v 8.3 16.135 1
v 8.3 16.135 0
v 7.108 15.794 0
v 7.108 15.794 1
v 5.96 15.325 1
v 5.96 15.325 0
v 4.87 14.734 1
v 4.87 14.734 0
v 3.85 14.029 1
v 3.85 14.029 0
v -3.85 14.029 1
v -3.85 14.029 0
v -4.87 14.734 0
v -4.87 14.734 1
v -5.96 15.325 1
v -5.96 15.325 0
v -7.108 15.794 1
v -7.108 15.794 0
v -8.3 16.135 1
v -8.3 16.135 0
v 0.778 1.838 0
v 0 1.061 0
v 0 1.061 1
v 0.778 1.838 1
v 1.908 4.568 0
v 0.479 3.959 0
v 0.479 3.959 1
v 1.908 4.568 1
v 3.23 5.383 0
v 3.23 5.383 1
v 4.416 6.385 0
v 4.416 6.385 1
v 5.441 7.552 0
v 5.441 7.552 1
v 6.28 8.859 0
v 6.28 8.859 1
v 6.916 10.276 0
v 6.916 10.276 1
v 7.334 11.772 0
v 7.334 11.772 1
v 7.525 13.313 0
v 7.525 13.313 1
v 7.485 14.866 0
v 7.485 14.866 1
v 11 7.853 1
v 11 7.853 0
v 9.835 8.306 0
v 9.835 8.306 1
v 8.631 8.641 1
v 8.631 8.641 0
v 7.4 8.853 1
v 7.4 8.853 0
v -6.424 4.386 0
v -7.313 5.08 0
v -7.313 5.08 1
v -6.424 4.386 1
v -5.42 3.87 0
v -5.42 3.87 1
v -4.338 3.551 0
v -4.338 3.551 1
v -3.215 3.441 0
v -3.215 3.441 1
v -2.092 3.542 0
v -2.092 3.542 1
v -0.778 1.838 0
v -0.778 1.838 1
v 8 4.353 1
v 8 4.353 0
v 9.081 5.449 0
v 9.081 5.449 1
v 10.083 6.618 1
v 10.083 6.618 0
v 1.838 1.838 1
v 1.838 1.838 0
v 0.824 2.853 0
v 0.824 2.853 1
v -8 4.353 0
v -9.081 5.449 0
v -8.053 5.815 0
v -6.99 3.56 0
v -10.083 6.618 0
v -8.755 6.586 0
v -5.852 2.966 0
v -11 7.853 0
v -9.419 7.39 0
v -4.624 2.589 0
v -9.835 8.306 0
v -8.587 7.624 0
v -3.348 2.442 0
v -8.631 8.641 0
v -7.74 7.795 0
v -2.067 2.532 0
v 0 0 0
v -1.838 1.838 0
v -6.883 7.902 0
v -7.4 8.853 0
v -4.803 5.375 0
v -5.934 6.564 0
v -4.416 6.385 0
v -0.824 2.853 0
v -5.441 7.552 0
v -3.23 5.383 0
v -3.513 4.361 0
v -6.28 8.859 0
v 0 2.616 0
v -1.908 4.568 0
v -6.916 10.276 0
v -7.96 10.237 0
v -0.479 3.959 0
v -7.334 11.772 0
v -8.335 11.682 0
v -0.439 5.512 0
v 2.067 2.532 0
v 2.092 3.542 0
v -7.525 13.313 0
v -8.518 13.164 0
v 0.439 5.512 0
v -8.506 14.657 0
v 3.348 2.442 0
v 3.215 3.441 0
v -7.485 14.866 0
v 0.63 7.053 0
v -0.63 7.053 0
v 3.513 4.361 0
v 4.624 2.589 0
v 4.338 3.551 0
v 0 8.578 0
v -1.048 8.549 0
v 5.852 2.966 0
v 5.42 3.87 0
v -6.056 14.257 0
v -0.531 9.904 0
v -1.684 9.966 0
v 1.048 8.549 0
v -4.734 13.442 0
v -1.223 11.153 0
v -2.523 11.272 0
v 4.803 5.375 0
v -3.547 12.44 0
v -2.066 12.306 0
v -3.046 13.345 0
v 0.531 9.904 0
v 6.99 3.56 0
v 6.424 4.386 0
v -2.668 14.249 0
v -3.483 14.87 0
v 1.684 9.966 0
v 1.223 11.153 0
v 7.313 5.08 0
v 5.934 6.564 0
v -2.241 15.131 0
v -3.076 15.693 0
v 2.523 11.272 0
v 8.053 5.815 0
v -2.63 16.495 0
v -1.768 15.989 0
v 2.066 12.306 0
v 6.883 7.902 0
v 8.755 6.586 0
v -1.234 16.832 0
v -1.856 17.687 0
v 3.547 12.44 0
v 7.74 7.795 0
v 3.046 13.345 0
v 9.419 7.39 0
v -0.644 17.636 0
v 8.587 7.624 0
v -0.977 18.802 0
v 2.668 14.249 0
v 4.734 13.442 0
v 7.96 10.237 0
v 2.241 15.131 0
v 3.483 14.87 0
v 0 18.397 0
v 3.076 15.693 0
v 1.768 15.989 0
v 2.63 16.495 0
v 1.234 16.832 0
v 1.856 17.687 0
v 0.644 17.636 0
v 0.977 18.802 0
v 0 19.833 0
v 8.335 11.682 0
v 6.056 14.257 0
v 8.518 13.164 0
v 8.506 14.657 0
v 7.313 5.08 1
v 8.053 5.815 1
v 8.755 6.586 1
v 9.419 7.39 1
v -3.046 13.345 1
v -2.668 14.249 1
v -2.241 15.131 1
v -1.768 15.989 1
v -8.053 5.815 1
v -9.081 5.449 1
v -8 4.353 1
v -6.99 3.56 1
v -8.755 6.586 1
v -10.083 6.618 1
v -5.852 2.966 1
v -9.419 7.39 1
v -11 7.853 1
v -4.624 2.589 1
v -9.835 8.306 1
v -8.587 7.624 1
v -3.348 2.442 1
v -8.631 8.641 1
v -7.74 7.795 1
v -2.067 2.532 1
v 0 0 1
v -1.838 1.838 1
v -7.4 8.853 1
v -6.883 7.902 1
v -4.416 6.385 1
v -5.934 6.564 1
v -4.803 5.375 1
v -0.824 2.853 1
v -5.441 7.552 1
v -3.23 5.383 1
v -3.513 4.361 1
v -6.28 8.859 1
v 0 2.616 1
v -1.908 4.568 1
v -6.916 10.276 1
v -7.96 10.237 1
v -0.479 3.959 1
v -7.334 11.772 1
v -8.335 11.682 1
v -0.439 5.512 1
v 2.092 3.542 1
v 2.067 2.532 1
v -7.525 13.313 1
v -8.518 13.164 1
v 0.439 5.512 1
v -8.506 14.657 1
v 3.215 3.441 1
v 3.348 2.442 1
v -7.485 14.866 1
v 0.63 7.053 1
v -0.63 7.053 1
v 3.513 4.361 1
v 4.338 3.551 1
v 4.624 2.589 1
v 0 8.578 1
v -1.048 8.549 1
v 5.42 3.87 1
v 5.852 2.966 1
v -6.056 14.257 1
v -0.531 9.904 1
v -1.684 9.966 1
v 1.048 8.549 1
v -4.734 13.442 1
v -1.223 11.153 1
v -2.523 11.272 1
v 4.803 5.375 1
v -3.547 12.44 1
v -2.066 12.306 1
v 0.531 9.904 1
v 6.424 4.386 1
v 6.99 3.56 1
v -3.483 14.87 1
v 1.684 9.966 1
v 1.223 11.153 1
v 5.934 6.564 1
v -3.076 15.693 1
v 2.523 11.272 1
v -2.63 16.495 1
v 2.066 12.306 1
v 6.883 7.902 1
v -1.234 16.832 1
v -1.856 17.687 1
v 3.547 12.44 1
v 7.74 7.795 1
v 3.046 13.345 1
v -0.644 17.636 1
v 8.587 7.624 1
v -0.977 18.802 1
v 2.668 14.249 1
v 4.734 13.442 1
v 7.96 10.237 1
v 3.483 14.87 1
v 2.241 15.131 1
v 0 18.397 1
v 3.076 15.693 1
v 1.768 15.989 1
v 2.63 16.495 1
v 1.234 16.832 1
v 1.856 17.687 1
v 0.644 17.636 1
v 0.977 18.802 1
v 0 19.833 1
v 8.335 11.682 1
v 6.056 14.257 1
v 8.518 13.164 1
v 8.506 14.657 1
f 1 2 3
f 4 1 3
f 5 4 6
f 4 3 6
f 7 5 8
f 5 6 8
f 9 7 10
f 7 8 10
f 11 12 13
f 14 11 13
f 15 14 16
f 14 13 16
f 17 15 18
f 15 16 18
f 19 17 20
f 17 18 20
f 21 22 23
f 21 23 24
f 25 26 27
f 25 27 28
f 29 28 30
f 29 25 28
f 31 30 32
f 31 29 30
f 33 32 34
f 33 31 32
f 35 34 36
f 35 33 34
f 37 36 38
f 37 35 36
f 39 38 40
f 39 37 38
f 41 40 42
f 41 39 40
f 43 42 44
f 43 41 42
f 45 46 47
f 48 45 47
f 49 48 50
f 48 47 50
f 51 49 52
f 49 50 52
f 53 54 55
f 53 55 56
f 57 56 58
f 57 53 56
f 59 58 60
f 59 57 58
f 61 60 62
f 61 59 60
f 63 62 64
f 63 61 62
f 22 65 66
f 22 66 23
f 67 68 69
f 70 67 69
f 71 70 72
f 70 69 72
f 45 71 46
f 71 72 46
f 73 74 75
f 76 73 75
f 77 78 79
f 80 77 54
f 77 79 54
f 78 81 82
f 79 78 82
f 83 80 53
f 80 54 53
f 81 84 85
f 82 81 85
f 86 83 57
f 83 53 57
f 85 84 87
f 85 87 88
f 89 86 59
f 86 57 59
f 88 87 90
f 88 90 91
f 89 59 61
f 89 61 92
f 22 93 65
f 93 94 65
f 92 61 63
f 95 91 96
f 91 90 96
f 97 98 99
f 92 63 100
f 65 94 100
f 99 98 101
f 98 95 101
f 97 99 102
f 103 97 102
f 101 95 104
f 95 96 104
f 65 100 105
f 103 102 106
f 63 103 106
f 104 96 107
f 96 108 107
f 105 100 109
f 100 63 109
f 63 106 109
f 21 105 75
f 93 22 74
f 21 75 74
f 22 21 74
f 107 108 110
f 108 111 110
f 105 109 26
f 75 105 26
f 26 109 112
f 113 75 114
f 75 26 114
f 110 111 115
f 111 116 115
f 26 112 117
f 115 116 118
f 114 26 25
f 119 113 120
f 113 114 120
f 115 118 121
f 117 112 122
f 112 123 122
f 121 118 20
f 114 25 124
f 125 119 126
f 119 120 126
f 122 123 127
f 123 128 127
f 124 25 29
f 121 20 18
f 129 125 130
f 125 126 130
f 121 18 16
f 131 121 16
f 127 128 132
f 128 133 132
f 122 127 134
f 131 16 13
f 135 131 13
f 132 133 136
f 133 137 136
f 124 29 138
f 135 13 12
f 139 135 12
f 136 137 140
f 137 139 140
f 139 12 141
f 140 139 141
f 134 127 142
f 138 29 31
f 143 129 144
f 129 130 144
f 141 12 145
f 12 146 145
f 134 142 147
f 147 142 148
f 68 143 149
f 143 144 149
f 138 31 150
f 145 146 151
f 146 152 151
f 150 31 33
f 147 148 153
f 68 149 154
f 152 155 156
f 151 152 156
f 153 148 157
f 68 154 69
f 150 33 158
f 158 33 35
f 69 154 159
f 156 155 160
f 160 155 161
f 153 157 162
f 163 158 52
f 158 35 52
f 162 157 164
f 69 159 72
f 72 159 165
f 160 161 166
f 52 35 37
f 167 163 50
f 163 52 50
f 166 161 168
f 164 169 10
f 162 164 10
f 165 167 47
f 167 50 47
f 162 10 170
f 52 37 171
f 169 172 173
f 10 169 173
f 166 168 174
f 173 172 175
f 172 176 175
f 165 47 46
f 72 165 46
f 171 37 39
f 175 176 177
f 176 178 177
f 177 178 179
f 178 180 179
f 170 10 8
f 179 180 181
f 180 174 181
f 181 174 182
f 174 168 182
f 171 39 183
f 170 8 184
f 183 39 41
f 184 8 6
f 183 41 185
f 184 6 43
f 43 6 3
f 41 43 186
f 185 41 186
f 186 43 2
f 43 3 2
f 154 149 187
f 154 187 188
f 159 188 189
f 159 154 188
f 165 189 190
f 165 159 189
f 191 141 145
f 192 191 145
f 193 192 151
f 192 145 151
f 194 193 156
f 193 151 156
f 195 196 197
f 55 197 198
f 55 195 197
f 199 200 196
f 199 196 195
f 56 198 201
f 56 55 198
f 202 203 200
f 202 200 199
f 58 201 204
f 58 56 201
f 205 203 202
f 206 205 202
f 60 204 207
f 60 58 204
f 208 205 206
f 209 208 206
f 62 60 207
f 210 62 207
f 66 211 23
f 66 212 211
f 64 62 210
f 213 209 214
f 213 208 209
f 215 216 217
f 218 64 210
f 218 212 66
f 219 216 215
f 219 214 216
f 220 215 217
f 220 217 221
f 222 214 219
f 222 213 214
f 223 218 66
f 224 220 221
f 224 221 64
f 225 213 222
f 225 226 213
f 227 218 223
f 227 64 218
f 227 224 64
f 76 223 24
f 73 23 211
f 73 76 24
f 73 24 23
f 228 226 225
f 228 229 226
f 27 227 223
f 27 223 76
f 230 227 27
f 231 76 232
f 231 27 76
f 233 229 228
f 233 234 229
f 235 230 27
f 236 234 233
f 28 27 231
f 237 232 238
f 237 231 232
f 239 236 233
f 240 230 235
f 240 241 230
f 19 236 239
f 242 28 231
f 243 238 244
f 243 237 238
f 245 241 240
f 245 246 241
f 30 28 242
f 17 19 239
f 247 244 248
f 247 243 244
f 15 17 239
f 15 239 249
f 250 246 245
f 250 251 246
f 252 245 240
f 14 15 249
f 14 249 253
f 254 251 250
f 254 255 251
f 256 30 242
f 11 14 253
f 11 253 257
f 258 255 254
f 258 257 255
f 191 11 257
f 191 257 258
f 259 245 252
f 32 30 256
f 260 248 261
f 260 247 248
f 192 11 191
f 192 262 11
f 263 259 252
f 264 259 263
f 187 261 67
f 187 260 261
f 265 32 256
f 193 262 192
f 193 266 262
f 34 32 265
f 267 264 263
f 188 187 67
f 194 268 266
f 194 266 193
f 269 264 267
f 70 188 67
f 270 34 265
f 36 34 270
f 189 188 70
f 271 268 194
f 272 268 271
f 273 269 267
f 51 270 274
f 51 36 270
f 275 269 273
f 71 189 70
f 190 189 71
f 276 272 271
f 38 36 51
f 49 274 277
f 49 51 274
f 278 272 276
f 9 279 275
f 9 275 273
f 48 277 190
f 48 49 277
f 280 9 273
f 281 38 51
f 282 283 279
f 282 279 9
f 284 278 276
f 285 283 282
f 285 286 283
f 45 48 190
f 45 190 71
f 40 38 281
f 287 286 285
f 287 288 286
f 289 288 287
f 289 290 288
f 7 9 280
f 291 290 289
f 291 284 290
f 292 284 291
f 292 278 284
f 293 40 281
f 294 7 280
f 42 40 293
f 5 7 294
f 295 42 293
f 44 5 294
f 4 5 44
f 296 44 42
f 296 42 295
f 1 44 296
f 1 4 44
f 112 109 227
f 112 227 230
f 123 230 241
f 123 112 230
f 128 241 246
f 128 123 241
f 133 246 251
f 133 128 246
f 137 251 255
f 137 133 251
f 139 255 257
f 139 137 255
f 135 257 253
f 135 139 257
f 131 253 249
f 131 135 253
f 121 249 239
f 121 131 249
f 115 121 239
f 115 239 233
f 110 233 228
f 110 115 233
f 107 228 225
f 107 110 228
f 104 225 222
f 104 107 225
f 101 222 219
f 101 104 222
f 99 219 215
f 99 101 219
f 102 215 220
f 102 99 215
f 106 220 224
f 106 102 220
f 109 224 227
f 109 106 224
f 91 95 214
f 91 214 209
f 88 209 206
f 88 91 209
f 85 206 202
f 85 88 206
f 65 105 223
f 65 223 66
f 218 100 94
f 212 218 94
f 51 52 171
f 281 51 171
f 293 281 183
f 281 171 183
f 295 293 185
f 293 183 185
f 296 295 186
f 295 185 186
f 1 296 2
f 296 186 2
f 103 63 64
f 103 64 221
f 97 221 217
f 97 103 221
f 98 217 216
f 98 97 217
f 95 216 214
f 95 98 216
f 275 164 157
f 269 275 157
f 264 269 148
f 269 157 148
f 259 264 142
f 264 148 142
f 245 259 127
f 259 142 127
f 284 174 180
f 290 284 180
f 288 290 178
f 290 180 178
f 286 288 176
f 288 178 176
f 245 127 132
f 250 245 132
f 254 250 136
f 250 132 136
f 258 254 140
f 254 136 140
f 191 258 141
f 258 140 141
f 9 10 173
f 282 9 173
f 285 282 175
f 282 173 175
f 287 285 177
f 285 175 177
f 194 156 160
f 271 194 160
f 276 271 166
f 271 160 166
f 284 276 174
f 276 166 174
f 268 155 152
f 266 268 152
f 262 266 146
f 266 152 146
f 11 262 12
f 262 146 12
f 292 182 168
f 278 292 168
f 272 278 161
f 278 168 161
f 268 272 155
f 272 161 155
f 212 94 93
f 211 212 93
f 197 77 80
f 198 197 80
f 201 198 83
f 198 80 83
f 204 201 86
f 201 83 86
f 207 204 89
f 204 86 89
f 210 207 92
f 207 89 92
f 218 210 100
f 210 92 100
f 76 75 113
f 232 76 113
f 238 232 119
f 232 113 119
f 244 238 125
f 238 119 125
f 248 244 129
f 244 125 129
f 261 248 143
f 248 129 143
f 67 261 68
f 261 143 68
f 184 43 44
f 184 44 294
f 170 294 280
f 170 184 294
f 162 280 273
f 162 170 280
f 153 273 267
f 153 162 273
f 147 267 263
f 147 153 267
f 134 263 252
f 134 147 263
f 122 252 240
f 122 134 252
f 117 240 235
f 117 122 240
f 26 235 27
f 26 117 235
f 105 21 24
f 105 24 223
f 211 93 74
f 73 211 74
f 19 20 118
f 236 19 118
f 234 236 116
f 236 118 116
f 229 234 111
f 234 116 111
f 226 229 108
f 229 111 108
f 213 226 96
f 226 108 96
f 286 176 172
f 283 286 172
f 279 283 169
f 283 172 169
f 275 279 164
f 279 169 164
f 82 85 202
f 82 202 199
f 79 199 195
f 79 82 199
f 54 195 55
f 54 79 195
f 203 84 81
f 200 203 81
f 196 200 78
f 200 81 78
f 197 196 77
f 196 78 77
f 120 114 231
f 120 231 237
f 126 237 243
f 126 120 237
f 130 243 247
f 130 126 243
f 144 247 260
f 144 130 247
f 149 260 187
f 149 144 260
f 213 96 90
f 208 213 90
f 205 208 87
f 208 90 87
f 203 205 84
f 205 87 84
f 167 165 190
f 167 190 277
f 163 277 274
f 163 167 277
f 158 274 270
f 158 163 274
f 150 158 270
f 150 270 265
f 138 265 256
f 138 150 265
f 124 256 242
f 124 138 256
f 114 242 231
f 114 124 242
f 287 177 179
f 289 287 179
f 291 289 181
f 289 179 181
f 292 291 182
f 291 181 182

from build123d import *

# Parameters (mm, degrees)
BOSS_EXTRUDE1_DEPTH = 1


with BuildPart() as part:
    # Sketch1 → Boss-Extrude1 (new body)
    with BuildSketch(Plane.XY):
        with BuildLine():
            Line((0, 0), (1.838477631, 1.838477631))
            Line((1.838477631, 1.838477631), (0.823678808, 2.853276454))
            ThreePointArc((0.823678808, 2.853276454), (4.623918861, 2.588642918), (8, 4.353276454))
            ThreePointArc((8, 4.353276454), (9.591924549, 6.024483983), (11, 7.853276454))
            ThreePointArc((11, 7.853276454), (9.237519313, 8.488345979), (7.4, 8.853276454))
            ThreePointArc((7.4, 8.853276454), (8.450856423, 12.419917717), (8.3, 16.135085474))
            ThreePointArc((8.3, 16.135085474), (5.960145608, 15.324834522), (3.85, 14.029183838))
            ThreePointArc((3.85, 14.029183838), (3.284007759, 15.28410345), (2.63, 16.495484604))
            ThreePointArc((2.63, 16.495484604), (1.429185762, 18.254368816), (0, 19.833310412))
            ThreePointArc((0, 19.833310412), (-1.429185762, 18.254368816), (-2.63, 16.495484604))
            ThreePointArc((-2.63, 16.495484604), (-3.284007759, 15.28410345), (-3.85, 14.029183838))
            ThreePointArc((-3.85, 14.029183838), (-5.960145608, 15.324834522), (-8.3, 16.135085474))
            ThreePointArc((-8.3, 16.135085474), (-8.450856423, 12.419917717), (-7.4, 8.853276454))
            ThreePointArc((-7.4, 8.853276454), (-9.237519313, 8.488345979), (-11, 7.853276454))
            ThreePointArc((-11, 7.853276454), (-9.591924549, 6.024483983), (-8, 4.353276454))
            ThreePointArc((-8, 4.353276454), (-4.623918861, 2.588642918), (-0.823678808, 2.853276454))
            Line((-0.823678808, 2.853276454), (-1.838477631, 1.838477631))
            Line((-1.838477631, 1.838477631), (0, 0))
        make_face()
        Polygon((0, 1.060660172), (0.777817459, 1.838477631), (0, 2.61629509), (-0.777817459, 1.838477631), align=None, mode=Mode.SUBTRACT)
        with BuildLine():
            ThreePointArc((1.767555689, 15.989332639), (2.460089794, 14.692656758), (3.046312622, 13.344578636))
            ThreePointArc((3.046312622, 13.344578636), (1.223262024, 11.152840308), (0, 8.577794598))
            ThreePointArc((0, 8.577794598), (-1.223262024, 11.152840308), (-3.046312622, 13.344578636))
            ThreePointArc((-3.046312622, 13.344578636), (-2.460089794, 14.692656758), (-1.767555689, 15.989332639))
            ThreePointArc((-1.767555689, 15.989332639), (-0.945525016, 17.238680092), (0, 18.397380194))
            ThreePointArc((0, 18.397380194), (0.945525016, 17.238680092), (1.767555689, 15.989332639))
        make_face(mode=Mode.SUBTRACT)
        with BuildLine():
            ThreePointArc((7.484522548, 14.86555012), (2.078927518, 10.634692843), (0.478972095, 3.959308692))
            ThreePointArc((0.478972095, 3.959308692), (5.884567125, 8.190165969), (7.484522548, 14.86555012))
        make_face(mode=Mode.SUBTRACT)
        with BuildLine():
            ThreePointArc((2.091646058, 3.542273843), (4.886787797, 3.684978553), (7.313103604, 5.080031806))
            ThreePointArc((7.313103604, 5.080031806), (8.408951023, 6.195914234), (9.418710619, 7.390259542))
            ThreePointArc((9.418710619, 7.390259542), (8.165419306, 7.717459739), (6.883314947, 7.901870952))
            ThreePointArc((6.883314947, 7.901870952), (4.803155716, 5.375111185), (2.091646058, 3.542273843))
        make_face(mode=Mode.SUBTRACT)
        with BuildLine():
            ThreePointArc((-6.883314947, 7.901870952), (-8.165419306, 7.717459739), (-9.418710619, 7.390259542))
            ThreePointArc((-9.418710619, 7.390259542), (-8.408951023, 6.195914234), (-7.313103604, 5.080031806))
            ThreePointArc((-7.313103604, 5.080031806), (-4.886787797, 3.684978553), (-2.091646058, 3.542273843))
            ThreePointArc((-2.091646058, 3.542273843), (-4.803155716, 5.375111185), (-6.883314947, 7.901870952))
        make_face(mode=Mode.SUBTRACT)
        with BuildLine():
            ThreePointArc((-7.484522548, 14.86555012), (-5.884567125, 8.190165969), (-0.478972095, 3.959308692))
            ThreePointArc((-0.478972095, 3.959308692), (-2.078927518, 10.634692843), (-7.484522548, 14.86555012))
        make_face(mode=Mode.SUBTRACT)
    extrude(amount=BOSS_EXTRUDE1_DEPTH)


solid = part.part
